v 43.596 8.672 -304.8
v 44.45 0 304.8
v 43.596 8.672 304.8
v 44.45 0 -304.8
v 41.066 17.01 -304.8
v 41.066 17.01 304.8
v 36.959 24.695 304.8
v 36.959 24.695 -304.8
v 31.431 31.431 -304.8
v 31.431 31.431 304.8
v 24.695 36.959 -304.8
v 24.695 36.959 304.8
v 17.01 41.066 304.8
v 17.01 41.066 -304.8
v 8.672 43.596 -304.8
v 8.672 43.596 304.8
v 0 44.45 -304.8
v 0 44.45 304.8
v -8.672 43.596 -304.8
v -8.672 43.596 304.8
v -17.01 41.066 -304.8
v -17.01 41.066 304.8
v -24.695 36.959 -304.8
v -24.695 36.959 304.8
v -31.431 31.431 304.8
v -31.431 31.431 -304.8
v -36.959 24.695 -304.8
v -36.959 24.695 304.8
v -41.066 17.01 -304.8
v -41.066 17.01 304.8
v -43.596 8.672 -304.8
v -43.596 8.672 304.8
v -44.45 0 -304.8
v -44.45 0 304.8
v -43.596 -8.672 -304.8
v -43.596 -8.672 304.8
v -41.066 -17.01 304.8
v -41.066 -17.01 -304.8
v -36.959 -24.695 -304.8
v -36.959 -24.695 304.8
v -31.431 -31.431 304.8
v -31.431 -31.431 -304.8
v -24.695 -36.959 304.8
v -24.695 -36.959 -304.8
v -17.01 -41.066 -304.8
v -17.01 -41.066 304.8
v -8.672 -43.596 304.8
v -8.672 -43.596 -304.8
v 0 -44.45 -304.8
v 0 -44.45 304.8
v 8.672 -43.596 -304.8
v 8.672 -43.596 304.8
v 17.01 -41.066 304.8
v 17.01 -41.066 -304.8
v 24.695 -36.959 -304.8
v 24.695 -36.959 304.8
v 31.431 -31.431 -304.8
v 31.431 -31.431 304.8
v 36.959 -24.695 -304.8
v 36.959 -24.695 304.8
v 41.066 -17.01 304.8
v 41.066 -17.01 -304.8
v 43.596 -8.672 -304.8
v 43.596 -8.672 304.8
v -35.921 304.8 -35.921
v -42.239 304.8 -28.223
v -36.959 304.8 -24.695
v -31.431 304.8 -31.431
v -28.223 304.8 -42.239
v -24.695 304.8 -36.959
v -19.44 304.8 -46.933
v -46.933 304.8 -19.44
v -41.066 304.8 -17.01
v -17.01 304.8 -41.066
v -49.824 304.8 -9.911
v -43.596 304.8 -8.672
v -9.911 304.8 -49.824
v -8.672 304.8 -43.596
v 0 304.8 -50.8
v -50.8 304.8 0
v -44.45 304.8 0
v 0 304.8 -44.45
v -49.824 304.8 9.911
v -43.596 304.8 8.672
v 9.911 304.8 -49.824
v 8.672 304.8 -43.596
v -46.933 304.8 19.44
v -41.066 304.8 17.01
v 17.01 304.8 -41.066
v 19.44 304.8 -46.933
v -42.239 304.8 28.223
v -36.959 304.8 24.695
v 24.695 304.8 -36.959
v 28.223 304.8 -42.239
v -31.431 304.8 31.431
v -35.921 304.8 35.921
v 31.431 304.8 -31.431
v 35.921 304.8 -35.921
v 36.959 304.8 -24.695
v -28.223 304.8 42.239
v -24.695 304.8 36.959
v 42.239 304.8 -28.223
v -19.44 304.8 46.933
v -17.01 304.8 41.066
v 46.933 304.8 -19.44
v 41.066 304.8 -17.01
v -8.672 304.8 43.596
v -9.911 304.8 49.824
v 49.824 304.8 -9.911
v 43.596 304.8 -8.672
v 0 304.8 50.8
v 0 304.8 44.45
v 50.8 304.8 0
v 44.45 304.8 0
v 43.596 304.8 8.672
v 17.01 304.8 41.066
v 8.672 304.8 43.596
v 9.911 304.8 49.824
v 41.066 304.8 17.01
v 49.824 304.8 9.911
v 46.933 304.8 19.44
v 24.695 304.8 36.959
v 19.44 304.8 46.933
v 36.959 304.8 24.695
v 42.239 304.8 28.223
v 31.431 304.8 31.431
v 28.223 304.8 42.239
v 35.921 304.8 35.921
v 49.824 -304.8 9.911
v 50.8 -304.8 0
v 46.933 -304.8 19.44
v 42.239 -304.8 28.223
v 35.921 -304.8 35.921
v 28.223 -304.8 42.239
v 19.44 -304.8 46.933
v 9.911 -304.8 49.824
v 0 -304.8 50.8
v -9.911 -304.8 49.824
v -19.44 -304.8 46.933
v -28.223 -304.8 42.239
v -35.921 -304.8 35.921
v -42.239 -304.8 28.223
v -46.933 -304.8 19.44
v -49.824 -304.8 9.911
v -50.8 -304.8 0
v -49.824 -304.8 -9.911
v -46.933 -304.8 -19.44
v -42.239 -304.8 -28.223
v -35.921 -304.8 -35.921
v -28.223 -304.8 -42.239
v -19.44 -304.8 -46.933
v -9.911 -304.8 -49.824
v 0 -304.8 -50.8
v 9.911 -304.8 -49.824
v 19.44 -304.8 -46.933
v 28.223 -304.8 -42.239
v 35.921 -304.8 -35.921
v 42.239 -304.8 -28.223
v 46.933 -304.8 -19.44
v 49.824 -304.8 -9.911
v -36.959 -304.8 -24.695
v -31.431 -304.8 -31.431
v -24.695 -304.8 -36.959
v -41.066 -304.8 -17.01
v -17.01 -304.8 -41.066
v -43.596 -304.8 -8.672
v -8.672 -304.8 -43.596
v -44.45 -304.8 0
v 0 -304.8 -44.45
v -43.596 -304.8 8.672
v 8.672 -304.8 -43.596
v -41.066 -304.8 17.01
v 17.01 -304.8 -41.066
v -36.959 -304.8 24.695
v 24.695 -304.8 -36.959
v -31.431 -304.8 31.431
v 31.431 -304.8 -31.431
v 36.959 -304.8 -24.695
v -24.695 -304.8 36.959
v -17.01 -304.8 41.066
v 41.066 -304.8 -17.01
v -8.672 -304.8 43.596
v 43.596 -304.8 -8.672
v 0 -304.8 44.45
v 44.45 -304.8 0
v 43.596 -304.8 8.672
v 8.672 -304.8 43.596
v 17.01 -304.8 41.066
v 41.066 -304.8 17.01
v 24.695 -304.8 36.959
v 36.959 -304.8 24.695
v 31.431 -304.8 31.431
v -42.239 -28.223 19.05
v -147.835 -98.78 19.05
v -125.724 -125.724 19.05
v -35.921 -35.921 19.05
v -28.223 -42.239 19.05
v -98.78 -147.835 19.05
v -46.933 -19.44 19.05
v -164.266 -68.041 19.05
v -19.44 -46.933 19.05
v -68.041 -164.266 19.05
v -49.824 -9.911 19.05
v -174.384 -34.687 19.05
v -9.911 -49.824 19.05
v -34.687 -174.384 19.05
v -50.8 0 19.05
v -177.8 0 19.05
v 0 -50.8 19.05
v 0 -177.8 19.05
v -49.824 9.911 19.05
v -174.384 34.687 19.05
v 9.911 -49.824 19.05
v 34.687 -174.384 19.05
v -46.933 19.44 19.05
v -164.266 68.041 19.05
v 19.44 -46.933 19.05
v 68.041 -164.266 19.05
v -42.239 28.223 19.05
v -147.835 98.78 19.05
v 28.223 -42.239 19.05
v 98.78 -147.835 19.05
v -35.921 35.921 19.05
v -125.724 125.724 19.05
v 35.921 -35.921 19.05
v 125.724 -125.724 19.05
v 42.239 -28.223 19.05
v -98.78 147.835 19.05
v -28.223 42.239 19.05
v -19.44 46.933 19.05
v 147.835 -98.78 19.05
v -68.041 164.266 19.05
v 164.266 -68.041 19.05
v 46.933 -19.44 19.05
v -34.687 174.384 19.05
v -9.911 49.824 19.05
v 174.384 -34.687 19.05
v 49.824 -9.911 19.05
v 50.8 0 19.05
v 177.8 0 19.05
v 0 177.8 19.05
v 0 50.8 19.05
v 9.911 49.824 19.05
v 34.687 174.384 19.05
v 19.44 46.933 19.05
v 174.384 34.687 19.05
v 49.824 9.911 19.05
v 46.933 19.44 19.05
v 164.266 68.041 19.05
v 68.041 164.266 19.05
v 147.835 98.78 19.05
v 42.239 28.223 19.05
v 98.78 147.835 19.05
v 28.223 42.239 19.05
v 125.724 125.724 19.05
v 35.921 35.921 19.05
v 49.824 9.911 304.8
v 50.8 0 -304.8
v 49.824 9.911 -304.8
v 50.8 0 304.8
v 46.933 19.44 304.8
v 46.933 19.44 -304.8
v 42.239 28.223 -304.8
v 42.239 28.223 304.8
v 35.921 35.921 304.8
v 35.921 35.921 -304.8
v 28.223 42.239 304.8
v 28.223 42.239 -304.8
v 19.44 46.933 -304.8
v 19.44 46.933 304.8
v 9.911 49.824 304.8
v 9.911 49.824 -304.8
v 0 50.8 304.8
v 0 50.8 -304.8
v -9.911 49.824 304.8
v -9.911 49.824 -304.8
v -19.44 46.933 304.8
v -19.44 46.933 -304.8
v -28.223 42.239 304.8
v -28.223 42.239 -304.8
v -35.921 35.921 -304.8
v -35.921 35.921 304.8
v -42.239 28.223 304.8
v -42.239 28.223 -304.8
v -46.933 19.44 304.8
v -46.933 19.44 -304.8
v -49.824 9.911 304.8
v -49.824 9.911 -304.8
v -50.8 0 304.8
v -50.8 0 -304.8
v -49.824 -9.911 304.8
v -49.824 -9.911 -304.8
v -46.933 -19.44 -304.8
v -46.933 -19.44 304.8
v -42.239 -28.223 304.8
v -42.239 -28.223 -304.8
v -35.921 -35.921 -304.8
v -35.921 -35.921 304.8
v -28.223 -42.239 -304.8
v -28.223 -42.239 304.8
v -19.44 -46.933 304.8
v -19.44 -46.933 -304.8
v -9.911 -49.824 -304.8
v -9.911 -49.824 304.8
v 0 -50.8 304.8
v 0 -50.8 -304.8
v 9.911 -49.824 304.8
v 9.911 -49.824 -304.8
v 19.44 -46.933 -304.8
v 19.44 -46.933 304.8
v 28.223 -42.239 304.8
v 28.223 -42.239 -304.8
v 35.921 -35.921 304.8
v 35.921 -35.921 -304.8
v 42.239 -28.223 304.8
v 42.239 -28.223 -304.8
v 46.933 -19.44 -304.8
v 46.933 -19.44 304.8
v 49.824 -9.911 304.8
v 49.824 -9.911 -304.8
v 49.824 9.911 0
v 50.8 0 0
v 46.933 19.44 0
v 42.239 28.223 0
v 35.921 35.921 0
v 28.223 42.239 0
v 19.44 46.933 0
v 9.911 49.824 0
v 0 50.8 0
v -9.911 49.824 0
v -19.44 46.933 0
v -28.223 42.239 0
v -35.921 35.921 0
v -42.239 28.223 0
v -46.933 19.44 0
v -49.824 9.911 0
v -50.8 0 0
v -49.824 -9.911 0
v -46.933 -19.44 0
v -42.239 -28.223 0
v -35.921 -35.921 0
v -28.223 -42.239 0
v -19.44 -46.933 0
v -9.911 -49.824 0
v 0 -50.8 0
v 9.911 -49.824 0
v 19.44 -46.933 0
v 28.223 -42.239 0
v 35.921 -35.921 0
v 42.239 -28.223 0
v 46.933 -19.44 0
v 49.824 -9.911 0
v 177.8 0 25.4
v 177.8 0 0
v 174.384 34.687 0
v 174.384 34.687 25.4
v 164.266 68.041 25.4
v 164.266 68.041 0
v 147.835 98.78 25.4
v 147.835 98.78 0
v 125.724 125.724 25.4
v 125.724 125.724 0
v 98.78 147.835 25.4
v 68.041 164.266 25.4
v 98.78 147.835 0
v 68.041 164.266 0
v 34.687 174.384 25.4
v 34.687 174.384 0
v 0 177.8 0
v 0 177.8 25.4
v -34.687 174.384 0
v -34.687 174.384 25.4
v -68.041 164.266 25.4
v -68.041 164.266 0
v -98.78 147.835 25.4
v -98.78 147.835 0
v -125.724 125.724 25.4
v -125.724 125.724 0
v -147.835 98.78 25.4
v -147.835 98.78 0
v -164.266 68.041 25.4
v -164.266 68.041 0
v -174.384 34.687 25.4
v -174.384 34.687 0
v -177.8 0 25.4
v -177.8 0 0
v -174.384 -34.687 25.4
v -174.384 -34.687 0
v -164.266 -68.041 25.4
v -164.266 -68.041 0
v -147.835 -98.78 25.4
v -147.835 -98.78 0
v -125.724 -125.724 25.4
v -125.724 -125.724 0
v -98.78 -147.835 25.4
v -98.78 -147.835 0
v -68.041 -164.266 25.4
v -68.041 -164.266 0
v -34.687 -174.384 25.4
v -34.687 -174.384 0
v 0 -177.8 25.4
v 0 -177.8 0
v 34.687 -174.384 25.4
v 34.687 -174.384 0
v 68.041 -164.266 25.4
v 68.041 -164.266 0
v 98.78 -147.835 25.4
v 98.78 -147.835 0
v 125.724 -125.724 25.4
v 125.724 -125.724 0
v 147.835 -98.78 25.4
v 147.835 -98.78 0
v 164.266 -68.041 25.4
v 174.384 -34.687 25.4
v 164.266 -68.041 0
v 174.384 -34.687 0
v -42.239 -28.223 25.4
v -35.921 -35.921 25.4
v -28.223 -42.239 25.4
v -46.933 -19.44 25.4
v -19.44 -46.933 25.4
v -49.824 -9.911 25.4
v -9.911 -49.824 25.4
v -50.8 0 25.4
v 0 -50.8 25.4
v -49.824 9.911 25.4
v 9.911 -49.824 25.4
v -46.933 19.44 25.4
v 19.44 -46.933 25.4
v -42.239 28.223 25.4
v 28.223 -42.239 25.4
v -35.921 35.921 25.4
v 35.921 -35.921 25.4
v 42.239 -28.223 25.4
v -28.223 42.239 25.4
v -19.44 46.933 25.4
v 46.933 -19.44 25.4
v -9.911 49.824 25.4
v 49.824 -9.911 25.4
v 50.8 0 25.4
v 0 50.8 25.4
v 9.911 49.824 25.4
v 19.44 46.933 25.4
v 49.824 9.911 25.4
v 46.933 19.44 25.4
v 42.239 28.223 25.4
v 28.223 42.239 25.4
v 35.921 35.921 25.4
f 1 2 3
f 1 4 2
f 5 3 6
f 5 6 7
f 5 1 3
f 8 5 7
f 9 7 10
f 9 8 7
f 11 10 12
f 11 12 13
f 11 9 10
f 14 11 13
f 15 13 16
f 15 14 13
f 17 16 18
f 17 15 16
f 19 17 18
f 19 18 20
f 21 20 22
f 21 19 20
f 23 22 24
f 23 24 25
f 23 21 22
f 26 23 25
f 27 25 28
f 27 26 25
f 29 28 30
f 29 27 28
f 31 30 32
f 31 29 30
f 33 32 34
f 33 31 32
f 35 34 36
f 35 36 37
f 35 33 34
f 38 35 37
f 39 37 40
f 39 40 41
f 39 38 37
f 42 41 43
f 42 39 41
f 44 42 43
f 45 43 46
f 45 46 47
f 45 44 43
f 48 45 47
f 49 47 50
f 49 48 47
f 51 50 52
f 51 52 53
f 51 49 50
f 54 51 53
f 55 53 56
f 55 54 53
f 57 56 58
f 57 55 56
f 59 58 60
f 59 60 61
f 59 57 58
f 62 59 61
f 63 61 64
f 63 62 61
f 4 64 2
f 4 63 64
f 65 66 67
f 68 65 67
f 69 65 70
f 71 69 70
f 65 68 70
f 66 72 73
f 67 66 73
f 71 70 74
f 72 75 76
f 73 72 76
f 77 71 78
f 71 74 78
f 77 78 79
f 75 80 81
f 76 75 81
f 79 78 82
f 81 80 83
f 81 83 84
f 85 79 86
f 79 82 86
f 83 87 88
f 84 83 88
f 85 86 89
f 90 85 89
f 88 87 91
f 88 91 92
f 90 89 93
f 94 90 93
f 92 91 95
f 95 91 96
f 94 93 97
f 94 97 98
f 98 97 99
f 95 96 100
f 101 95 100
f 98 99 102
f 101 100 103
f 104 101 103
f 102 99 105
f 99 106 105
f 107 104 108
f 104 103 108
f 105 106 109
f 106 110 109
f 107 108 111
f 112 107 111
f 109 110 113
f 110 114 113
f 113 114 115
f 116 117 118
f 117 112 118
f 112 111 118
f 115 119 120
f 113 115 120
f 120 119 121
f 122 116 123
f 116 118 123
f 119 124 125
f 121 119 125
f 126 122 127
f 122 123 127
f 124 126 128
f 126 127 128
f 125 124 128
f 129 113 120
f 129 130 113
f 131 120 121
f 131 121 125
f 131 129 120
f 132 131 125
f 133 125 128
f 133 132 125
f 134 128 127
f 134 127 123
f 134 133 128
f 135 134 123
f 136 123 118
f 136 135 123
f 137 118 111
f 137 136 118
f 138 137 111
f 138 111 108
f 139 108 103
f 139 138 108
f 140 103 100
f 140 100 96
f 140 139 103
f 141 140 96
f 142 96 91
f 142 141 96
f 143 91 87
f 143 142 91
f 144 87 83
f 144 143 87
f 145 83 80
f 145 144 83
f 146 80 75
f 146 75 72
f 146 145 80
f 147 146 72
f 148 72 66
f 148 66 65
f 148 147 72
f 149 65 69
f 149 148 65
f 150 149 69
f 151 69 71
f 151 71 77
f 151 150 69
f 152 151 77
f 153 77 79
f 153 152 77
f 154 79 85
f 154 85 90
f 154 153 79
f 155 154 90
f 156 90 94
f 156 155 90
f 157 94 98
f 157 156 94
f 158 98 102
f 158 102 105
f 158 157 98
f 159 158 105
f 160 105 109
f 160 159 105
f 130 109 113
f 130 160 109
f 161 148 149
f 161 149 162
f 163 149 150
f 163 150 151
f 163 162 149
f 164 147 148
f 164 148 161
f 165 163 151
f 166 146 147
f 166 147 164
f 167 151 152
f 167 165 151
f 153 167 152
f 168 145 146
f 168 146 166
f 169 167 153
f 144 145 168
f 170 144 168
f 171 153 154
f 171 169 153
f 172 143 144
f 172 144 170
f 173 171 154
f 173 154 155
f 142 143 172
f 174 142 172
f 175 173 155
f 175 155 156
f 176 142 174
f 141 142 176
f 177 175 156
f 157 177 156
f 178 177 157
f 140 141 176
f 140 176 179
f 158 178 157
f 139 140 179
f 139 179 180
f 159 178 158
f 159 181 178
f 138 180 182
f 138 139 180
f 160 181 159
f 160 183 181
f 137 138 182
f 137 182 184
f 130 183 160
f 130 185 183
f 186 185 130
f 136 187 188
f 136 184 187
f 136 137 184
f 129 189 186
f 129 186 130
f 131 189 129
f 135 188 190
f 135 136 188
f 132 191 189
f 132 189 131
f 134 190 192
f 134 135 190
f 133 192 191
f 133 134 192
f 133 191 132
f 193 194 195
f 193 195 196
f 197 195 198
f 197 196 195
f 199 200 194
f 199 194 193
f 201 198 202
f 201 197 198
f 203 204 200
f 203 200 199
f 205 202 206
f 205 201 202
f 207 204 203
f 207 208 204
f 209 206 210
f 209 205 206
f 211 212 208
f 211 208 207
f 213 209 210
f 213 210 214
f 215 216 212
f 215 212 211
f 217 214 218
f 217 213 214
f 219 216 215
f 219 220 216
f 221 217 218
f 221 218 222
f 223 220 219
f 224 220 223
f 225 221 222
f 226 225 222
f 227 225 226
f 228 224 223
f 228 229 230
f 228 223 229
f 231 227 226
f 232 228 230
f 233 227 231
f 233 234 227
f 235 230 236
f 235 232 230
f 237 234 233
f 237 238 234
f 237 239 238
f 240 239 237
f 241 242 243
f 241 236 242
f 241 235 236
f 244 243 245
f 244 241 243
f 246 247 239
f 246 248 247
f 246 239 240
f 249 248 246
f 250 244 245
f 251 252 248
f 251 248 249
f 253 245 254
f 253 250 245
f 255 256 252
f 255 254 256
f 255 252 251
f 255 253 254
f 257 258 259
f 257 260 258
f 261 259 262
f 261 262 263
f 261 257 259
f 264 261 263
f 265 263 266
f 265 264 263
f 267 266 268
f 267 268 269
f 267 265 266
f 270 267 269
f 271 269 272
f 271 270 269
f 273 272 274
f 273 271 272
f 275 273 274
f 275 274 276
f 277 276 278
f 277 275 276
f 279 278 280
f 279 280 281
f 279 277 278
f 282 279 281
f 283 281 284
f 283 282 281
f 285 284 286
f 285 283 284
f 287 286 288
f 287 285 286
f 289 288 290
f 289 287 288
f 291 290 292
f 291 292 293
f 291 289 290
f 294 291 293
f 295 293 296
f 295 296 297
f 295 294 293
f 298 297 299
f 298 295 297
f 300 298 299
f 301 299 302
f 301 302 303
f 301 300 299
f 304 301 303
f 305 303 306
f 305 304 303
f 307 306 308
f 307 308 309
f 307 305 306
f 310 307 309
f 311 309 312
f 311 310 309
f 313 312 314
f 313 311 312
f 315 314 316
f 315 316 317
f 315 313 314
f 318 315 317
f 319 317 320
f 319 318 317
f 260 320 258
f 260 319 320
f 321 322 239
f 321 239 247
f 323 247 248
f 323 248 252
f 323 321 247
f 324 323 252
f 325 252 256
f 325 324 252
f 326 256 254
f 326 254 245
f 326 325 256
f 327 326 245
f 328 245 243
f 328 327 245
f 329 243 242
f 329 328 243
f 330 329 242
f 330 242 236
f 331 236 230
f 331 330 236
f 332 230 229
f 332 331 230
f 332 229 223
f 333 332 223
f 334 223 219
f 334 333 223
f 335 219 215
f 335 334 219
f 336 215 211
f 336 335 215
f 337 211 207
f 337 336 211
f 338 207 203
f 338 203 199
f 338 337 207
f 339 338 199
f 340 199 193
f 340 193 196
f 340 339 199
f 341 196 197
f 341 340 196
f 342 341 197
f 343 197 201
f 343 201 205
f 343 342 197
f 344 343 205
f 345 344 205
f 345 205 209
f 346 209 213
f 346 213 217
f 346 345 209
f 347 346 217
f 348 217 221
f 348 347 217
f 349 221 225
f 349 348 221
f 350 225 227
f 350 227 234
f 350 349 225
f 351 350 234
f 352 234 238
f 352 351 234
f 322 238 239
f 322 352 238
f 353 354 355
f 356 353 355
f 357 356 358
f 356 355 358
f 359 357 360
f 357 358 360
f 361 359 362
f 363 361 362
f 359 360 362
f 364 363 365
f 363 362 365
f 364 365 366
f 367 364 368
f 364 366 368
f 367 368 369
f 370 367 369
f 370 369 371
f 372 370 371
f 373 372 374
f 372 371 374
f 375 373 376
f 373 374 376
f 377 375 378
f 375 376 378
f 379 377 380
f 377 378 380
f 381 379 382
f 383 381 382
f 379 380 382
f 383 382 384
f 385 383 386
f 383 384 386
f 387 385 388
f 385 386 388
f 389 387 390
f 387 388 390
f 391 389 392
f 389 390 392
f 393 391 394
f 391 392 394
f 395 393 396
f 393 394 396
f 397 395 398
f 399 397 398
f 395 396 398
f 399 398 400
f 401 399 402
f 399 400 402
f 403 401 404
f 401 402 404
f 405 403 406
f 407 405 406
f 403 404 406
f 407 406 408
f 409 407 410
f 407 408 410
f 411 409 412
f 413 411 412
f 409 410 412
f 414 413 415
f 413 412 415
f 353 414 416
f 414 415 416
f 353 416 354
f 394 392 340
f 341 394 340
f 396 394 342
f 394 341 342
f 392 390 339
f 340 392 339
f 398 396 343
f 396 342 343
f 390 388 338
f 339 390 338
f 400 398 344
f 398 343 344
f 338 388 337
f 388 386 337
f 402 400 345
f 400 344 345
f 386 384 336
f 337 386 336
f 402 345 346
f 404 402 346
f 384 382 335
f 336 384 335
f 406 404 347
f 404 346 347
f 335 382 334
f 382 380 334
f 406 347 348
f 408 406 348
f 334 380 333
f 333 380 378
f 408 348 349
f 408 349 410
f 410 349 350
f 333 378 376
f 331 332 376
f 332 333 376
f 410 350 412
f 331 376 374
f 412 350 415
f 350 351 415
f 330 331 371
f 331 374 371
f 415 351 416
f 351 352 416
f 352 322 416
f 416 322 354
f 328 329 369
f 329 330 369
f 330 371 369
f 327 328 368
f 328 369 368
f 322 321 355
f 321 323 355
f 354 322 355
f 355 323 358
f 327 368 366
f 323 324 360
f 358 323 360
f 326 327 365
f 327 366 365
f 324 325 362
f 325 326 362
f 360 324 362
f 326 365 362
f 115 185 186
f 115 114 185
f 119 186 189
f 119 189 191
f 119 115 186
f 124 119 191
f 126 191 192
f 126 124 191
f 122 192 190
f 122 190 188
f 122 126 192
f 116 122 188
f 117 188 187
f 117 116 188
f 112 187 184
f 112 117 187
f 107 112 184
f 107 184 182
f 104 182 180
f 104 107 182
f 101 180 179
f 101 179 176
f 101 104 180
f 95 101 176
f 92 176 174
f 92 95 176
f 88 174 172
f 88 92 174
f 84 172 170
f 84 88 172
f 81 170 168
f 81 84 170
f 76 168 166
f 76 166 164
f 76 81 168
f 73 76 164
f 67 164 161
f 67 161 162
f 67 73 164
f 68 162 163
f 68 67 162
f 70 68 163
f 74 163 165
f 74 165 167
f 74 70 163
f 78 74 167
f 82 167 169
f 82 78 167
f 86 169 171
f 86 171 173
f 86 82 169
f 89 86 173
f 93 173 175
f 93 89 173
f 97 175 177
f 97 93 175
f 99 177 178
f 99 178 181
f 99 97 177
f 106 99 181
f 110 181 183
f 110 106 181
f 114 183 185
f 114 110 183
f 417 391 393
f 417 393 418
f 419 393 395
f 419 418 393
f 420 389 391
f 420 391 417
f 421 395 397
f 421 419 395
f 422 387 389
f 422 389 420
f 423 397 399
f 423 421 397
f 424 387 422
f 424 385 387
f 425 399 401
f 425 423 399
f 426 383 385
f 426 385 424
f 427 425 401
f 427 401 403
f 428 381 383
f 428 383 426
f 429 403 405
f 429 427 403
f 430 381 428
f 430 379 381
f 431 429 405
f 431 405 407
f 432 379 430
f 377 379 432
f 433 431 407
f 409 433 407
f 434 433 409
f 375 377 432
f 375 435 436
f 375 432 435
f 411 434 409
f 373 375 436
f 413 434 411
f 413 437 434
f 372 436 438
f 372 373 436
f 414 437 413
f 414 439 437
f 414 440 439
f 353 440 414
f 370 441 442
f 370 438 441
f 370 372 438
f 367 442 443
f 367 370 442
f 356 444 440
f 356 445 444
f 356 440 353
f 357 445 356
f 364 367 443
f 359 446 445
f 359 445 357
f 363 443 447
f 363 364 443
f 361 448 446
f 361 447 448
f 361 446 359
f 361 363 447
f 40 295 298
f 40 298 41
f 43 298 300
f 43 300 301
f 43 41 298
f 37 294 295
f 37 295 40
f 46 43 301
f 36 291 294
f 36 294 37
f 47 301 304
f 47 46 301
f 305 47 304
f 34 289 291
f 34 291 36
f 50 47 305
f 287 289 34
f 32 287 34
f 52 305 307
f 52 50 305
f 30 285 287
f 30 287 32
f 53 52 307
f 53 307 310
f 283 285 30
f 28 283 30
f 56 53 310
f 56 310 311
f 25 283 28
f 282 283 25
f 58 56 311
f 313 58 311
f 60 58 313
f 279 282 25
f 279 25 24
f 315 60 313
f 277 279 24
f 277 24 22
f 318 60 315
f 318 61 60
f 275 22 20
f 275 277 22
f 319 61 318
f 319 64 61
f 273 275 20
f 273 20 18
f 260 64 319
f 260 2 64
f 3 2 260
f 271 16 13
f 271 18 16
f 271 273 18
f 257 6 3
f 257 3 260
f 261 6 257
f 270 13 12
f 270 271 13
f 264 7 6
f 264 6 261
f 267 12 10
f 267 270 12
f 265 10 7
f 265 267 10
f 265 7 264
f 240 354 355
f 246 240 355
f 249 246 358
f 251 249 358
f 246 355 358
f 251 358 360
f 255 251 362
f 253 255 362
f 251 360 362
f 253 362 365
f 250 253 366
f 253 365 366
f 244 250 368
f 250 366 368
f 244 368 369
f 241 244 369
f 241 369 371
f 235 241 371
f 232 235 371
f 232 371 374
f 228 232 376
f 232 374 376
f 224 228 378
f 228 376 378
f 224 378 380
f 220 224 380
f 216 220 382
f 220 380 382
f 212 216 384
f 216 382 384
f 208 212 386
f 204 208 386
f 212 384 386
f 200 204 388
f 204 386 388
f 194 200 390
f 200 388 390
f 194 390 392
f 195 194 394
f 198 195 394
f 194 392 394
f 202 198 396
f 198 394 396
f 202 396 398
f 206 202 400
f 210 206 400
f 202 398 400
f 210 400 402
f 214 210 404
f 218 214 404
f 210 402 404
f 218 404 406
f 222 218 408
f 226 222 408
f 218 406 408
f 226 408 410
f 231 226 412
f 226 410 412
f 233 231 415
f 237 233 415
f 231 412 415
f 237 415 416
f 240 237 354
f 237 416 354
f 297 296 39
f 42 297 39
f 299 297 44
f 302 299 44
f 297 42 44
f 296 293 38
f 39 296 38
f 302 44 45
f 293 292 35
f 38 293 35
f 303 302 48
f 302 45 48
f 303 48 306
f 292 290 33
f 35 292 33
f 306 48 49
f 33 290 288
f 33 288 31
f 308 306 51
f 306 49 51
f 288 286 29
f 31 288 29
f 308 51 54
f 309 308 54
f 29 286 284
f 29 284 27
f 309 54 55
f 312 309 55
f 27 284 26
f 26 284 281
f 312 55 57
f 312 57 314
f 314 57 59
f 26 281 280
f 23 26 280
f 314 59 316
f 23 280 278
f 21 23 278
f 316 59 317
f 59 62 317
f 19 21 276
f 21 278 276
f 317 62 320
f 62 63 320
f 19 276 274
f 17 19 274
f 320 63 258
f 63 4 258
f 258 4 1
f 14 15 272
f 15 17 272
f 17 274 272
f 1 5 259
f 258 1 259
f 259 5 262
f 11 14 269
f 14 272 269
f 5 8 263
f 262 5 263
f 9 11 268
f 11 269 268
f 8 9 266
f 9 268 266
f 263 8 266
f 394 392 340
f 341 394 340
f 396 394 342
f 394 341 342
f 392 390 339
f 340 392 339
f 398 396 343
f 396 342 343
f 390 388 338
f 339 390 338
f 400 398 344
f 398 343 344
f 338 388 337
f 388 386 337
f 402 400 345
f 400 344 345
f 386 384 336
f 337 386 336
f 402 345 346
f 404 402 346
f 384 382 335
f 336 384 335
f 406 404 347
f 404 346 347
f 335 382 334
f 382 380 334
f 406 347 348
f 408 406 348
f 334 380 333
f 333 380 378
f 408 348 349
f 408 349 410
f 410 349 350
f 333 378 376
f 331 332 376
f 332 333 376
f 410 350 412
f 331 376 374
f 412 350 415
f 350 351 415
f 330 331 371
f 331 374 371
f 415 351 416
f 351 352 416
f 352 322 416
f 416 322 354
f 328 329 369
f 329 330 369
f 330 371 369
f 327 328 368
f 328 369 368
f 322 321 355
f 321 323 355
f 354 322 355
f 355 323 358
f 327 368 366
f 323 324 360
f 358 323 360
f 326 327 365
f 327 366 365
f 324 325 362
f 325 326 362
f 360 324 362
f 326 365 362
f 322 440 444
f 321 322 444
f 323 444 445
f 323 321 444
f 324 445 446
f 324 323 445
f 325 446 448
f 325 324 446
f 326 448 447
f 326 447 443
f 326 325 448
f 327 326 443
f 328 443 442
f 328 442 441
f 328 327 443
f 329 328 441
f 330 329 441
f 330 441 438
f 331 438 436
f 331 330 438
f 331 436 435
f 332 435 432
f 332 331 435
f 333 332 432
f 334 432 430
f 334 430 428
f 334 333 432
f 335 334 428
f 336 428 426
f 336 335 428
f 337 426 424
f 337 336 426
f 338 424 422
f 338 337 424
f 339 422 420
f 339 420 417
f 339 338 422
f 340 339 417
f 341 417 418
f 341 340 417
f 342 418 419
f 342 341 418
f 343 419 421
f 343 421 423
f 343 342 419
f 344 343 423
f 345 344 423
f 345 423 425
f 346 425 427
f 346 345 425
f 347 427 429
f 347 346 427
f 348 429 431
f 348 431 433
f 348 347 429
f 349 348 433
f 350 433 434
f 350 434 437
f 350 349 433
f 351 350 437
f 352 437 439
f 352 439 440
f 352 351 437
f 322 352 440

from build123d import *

# Parameters (mm, degrees)
F0_R     = 50.8
F0_R_2   = 44.45
F1_DEPTH = 304.8
F2_R     = 50.8
F2_R_2   = 44.45
F3_DEPTH = 304.8
F4_R     = 177.8
F4_R_2   = 50.8
F5_DEPTH = 19.05
F6_R     = 177.8
F6_R_2   = 50.8
F7_DEPTH = 25.4


with BuildPart() as f1:
    # F0 (on Front) → F1 (new body, symmetric)
    with BuildSketch(Plane.XZ):
        Circle(F0_R)
        Circle(F0_R_2, mode=Mode.SUBTRACT)
    extrude(amount=F1_DEPTH, both=True)


with BuildPart() as f3:
    # F2 (on Top) → F3 (new body, symmetric)
    with BuildSketch(Plane.XY):
        Circle(F2_R)
        Circle(F2_R_2, mode=Mode.SUBTRACT)
    extrude(amount=F3_DEPTH, both=True)


with BuildPart() as f5:
    # F4 (on Top) → F5 (new body)
    with BuildSketch(Plane.XY):
        Circle(F4_R)
        Circle(F4_R_2, mode=Mode.SUBTRACT)
    extrude(amount=F5_DEPTH)


with BuildPart() as f7:
    # F6 (on Top) → F7 (new body)
    with BuildSketch(Plane.XY):
        Circle(F6_R)
        Circle(F6_R_2, mode=Mode.SUBTRACT)
    extrude(amount=F7_DEPTH)


solid = Compound([f1.part, f3.part, f5.part, f7.part])
